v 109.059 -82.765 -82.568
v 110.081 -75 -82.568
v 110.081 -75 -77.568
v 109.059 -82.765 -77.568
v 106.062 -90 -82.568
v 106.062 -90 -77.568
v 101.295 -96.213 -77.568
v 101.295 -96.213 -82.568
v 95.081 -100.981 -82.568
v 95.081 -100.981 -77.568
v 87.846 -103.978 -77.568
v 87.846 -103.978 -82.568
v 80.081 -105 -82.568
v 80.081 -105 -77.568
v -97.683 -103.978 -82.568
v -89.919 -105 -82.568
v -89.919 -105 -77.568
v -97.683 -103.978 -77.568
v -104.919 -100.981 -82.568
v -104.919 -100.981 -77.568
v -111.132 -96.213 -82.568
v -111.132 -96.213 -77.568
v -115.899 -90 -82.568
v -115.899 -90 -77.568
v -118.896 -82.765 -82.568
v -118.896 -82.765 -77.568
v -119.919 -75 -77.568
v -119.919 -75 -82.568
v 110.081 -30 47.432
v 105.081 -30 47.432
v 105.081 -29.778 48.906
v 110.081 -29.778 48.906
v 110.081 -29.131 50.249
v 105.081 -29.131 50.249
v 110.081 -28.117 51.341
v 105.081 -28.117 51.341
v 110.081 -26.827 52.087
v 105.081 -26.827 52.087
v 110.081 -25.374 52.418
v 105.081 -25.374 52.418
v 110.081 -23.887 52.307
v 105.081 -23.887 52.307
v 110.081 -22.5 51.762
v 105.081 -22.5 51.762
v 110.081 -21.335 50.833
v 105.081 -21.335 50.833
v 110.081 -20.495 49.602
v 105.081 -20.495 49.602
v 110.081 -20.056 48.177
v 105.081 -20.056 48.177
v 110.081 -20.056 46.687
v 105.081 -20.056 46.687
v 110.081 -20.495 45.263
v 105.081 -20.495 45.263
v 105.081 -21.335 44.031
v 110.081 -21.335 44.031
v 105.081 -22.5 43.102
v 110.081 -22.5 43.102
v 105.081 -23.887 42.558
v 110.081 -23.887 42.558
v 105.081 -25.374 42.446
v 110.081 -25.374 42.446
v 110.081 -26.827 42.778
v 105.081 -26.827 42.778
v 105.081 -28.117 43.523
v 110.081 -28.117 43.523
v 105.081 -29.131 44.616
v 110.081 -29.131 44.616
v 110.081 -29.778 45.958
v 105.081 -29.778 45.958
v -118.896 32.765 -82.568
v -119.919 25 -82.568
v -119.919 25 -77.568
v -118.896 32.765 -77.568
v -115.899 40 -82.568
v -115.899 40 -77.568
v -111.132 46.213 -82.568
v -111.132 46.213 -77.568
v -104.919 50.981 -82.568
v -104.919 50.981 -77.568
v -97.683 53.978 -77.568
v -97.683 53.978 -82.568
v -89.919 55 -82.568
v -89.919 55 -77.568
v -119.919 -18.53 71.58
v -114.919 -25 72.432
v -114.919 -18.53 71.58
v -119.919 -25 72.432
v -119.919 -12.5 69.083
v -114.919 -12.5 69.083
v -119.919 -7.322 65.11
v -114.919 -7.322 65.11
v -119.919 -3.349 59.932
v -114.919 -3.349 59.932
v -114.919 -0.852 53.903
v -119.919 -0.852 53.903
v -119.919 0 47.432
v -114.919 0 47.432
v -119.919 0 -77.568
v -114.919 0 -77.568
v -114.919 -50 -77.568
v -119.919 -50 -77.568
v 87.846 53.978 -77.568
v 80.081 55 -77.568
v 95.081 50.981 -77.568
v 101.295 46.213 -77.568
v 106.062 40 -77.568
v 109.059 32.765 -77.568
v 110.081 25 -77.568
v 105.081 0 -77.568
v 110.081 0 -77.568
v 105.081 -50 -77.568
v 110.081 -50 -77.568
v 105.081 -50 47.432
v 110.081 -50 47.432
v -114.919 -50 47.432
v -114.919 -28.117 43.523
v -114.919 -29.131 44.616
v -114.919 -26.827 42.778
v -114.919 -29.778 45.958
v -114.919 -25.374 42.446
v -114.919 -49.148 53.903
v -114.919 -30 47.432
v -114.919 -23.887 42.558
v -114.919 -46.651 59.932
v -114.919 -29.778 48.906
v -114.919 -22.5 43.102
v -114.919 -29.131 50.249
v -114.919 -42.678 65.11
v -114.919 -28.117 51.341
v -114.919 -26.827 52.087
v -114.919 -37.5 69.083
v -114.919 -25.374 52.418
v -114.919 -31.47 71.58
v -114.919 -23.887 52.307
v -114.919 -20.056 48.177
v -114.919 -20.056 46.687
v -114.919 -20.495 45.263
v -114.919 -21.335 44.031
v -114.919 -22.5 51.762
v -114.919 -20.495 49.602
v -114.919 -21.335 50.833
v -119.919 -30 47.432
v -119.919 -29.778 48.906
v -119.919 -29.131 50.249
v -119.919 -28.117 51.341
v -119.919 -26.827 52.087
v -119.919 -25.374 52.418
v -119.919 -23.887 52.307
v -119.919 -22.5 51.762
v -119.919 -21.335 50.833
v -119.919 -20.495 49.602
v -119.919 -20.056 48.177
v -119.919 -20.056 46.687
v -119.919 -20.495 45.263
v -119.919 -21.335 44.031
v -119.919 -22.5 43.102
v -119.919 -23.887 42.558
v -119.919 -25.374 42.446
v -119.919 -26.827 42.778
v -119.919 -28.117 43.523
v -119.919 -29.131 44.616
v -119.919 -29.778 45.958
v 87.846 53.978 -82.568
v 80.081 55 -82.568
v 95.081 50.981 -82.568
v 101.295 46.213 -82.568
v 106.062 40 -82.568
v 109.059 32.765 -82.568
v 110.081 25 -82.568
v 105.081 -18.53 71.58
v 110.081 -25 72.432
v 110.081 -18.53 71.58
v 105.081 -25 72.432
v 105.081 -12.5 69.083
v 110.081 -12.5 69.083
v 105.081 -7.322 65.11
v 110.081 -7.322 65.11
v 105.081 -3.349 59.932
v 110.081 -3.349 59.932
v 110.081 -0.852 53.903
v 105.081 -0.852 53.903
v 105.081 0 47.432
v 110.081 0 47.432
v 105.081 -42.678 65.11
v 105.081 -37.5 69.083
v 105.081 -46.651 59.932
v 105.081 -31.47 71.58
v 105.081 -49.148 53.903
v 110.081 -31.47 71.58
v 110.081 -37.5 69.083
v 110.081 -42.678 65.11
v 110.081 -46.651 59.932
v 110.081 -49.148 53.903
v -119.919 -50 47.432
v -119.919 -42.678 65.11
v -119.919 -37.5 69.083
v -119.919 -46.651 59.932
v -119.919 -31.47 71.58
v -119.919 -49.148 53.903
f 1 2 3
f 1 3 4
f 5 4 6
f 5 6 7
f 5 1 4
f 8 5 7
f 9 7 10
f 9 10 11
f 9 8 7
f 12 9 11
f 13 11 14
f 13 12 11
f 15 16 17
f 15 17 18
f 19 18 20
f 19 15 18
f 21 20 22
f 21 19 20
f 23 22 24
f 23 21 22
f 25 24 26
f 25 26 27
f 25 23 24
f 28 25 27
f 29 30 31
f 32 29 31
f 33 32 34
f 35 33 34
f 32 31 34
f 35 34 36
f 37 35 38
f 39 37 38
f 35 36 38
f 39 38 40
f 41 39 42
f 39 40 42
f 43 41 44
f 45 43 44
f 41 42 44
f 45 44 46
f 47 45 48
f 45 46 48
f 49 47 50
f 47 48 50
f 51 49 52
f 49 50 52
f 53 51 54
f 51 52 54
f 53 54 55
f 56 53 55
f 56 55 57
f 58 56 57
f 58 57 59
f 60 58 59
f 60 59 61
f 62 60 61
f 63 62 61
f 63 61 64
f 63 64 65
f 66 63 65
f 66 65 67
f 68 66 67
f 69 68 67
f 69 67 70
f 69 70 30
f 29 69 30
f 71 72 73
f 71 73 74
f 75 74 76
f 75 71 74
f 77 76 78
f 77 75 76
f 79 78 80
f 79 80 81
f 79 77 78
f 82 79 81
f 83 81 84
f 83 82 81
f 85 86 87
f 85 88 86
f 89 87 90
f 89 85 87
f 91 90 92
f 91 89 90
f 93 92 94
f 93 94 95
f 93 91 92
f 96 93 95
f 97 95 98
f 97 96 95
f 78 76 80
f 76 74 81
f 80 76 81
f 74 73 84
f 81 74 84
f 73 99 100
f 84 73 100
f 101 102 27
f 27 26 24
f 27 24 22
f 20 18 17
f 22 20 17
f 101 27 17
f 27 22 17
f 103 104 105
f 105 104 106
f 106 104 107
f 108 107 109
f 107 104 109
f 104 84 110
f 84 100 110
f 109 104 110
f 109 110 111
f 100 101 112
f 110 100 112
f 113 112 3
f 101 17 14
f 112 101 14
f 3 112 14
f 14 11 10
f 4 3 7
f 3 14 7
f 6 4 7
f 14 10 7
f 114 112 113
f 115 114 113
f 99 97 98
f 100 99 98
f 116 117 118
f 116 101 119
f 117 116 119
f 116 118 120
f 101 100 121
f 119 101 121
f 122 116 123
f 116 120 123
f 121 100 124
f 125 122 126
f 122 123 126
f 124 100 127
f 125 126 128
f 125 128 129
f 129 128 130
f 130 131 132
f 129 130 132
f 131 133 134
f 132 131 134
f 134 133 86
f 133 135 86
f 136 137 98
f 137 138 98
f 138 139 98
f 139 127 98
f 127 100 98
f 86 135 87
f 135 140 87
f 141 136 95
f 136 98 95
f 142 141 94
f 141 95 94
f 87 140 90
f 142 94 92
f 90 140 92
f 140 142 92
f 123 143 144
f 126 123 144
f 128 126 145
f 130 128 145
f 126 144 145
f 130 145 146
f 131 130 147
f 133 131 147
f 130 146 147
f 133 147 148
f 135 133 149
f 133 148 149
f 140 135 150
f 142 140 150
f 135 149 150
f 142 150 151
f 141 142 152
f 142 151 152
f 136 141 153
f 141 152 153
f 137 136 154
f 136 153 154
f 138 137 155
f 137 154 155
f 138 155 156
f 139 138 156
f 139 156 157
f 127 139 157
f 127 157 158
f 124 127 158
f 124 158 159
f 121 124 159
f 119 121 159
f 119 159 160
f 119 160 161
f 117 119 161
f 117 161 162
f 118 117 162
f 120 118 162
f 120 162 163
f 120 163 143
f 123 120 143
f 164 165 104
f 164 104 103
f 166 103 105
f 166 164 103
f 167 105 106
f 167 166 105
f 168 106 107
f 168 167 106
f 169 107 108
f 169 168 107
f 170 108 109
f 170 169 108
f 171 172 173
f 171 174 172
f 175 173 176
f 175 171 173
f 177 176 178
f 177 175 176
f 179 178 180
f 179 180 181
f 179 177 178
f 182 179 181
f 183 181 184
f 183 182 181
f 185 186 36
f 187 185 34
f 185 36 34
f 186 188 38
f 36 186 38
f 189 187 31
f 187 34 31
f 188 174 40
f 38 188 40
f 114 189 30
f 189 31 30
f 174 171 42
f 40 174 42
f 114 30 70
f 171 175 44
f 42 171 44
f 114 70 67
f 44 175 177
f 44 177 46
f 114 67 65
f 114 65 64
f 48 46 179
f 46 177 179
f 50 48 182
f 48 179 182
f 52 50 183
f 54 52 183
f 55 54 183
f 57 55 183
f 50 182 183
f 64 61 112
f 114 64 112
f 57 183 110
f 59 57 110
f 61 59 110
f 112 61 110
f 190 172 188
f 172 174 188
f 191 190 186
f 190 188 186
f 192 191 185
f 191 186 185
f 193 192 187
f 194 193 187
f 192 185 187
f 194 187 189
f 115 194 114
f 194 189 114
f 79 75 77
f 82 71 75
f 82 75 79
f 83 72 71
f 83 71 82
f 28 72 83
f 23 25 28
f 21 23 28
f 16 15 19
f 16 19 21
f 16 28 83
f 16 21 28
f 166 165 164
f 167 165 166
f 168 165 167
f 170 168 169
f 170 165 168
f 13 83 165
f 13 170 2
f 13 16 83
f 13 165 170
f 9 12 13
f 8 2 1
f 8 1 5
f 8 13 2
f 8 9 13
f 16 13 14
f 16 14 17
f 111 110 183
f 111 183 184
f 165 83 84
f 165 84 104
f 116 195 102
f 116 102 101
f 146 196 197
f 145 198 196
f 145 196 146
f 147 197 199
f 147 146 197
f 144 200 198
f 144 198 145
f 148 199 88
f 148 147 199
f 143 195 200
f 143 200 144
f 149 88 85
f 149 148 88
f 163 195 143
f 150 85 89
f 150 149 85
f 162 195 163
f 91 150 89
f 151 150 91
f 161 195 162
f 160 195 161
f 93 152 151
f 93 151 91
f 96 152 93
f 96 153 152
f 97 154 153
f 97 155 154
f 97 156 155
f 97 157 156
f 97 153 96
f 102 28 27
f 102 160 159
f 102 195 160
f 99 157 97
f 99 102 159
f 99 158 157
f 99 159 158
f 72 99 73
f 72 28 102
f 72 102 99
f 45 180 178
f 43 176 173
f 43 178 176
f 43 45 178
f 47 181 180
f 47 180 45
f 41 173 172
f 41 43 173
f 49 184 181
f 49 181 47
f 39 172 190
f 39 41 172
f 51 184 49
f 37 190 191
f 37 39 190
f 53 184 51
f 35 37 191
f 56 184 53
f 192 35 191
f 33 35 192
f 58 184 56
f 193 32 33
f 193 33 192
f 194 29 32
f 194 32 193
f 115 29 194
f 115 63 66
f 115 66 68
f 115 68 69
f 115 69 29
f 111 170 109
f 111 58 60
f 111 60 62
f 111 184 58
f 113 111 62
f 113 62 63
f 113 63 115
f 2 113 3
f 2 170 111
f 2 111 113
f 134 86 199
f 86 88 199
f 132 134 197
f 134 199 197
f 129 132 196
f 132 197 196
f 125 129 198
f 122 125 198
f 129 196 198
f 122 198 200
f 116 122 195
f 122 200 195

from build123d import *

# Parameters (mm, degrees)
F1_DEPTH = 50
F2_R     = 24.99999
F3_R     = 5
F4_DEPTH = 230.001
F6_DEPTH = 5


# Not quite as in the source:
# - a fillet or chamfer is up to 0.001 mm smaller than in the source, because OpenCascade refuses the exact size


with BuildPart() as f1:
    # F0 (on Front) → F1 (new body)
    with BuildSketch(Plane.XZ):
        Polygon((-119.9185385572, 72.4322550792), (-119.9185385572, -82.5677449208), (110.0814614428, -82.5677449208), (110.0814614428, 72.4322550792), (105.0814614428, 72.4322550792), (105.0814614428, -77.5677449208), (-114.9185385572, -77.5677449208), (-114.9185385572, 72.4322550792), align=None)
    extrude(amount=F1_DEPTH)

    # F2 (radius 25 in the source; OpenCascade refuses exactly that, so slightly less here)
    f2_edges = [f1.edges().sort_by_distance(p)[0] for p in [
        (-117.418539, -50, 72.432255),
        (-117.418539, 0, 72.432255),
        (107.581461, -50, 72.432255),
        (107.581461, 0, 72.432255),
    ]]
    fillet(f2_edges, radius=F2_R)

    # F3 (on face) → F4 (cut, through all)
    with BuildSketch(Plane(origin=(-119.9185385572, 0, 0), x_dir=(0, -1, 0), z_dir=(-1, 0, 0))):
        with Locations((25, 47.4322550792)):
            Circle(F3_R)
    extrude(amount=-F4_DEPTH, mode=Mode.SUBTRACT)

    # F5 (on face) → F6 (join)
    with BuildSketch(Plane(origin=(0, 0, -82.5677449208), x_dir=(1, 0, 0), z_dir=(0, 0, -1))):
        with BuildLine():
            Line((80.0814614428, 105), (-89.9185385572, 105))
            ThreePointArc((-89.9185385572, 105), (-111.1317419928, 96.2132034356), (-119.9185385572, 75))
            Line((-119.9185385572, 75), (-119.9185385572, -25))
            ThreePointArc((-119.9185385572, -25), (-111.1317419928, -46.2132034356), (-89.9185385572, -55))
            Line((-89.9185385572, -55), (80.0814614428, -55))
            ThreePointArc((80.0814614428, -55), (101.2946648784, -46.2132034356), (110.0814614428, -25))
            Line((110.0814614428, -25), (110.0814614428, 75))
            ThreePointArc((110.0814614428, 75), (101.2946648784, 96.2132034356), (80.0814614428, 105))
        make_face()
    extrude(amount=-F6_DEPTH)


solid = f1.part
